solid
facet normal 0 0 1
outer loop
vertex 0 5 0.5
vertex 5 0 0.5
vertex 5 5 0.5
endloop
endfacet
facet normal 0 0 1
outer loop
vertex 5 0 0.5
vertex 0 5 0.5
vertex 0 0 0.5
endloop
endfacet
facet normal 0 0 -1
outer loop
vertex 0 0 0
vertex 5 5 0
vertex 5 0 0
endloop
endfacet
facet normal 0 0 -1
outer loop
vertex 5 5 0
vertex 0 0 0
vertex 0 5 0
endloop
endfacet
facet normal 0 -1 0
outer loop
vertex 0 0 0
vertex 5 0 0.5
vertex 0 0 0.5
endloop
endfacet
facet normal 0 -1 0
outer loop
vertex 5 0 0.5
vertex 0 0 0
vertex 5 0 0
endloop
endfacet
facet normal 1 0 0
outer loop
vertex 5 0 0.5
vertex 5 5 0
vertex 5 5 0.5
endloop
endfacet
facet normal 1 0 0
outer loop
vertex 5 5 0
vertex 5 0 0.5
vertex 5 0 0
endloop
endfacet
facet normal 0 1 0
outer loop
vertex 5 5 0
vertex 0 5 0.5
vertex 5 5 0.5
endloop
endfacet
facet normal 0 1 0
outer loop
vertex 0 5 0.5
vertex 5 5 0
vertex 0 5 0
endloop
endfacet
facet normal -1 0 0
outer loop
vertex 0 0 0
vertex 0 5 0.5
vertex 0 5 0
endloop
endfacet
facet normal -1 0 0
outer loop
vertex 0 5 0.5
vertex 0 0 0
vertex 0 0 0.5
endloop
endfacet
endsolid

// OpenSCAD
/* [Box] */
width = 10;  // [1:100]
height = 20;

/* [Hidden] */
// ======== include <lib.scad> ========
LIBCONST = 5;
module part(h) cube([LIBCONST, LIBCONST, h]);

// ======== main.scad (continued) ========
ratio = width / height;

part(ratio);
